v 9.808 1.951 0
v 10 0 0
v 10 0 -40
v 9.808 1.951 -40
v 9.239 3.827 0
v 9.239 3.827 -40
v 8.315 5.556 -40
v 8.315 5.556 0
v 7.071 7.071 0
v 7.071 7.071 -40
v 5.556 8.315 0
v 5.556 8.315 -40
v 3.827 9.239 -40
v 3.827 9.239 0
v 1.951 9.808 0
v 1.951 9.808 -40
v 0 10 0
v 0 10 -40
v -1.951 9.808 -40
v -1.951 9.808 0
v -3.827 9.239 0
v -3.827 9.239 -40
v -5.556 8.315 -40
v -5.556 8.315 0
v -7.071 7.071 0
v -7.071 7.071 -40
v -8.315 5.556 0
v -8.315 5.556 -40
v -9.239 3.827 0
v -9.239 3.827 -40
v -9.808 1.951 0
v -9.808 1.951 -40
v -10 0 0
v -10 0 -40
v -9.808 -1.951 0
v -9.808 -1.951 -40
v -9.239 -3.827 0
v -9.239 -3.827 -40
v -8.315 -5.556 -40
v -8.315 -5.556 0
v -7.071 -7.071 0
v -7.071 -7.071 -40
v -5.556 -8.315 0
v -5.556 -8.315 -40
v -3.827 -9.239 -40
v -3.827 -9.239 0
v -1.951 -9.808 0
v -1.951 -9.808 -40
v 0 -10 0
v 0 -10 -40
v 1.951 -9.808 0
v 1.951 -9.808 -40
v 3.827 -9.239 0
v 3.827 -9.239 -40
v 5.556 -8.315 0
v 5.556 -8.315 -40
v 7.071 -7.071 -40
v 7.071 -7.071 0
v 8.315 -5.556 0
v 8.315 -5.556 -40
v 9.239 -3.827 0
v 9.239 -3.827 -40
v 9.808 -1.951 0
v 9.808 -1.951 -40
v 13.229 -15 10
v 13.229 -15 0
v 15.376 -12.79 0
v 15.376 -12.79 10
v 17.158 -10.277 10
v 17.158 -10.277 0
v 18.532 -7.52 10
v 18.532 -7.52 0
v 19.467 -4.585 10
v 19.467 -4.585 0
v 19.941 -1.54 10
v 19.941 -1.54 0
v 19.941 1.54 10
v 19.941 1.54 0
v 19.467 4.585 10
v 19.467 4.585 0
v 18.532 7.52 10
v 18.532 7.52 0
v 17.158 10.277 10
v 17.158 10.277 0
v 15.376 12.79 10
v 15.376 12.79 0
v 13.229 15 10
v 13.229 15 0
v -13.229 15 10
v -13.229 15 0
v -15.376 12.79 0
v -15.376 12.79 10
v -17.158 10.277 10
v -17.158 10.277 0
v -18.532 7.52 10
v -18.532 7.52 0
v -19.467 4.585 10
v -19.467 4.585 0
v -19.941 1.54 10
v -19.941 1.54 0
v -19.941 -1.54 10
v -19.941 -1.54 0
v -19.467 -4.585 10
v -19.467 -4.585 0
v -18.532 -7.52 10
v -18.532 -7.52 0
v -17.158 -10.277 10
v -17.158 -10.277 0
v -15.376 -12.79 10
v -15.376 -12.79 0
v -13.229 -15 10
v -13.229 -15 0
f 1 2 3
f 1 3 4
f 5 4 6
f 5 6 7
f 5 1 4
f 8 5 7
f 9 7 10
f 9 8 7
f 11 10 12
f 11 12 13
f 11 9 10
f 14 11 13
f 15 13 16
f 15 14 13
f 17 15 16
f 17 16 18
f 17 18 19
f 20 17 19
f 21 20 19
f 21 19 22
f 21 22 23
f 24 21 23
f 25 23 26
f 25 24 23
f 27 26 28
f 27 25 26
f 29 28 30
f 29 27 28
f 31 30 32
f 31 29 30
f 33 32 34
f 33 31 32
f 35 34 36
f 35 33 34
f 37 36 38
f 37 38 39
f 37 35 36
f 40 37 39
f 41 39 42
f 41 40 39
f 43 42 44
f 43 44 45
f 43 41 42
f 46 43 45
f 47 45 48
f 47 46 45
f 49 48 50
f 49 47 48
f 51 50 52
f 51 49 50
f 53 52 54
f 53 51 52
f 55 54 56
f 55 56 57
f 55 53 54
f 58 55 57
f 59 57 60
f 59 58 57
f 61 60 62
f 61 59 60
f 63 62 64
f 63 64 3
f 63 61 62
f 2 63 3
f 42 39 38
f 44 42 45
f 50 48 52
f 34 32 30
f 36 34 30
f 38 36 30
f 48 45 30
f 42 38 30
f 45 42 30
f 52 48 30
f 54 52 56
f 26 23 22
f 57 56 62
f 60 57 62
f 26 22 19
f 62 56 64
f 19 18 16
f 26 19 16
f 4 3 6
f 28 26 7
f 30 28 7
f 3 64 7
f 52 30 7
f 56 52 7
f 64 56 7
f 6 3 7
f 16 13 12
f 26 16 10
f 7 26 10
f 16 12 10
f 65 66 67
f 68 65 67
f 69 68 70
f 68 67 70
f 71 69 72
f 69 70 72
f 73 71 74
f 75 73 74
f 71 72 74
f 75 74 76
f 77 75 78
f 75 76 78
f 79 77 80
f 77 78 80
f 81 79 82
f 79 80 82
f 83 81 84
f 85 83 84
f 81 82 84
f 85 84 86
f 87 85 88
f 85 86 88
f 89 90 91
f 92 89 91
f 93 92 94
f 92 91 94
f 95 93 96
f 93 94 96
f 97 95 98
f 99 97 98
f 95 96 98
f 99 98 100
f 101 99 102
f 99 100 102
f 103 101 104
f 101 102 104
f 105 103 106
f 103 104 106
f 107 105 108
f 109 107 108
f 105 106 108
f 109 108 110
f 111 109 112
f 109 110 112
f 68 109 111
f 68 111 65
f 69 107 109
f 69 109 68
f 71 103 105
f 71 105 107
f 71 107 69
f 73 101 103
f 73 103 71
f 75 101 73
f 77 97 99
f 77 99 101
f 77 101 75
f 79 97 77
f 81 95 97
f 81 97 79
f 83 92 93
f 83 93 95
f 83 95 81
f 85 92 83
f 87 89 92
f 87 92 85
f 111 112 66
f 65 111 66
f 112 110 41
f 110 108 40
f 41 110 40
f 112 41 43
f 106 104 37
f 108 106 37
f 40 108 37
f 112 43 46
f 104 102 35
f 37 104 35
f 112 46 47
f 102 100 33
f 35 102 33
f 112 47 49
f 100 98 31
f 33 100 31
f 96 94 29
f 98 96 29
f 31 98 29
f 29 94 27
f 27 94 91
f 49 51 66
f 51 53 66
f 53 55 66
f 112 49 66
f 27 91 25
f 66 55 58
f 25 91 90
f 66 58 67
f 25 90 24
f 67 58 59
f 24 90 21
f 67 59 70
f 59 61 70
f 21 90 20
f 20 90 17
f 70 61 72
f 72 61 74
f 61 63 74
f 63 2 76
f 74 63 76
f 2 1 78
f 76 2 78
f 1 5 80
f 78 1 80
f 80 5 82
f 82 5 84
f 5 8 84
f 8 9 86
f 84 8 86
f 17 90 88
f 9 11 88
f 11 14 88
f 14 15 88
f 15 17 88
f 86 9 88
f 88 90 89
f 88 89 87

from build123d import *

# Parameters (mm, degrees)
PAD_DEPTH    = 10
SKETCH001_R  = 10
PAD001_DEPTH = 40


with BuildPart() as part:
    # Sketch → Pad (new body)
    with BuildSketch(Plane.XY):
        with BuildLine():
            ThreePointArc((13.228757, -15), (20, 0), (13.228757, 15))
            Line((-13.228757, 15), (13.228757, 15))
            ThreePointArc((-13.228757, 15), (-20, 0), (-13.228757, -15))
            Line((-13.228757, -15), (13.228757, -15))
        make_face()
    extrude(amount=PAD_DEPTH)

    # Sketch001 → Pad001 (join)
    with BuildSketch(Plane.XY):
        Circle(SKETCH001_R)
    extrude(amount=-PAD001_DEPTH)


solid = part.part
